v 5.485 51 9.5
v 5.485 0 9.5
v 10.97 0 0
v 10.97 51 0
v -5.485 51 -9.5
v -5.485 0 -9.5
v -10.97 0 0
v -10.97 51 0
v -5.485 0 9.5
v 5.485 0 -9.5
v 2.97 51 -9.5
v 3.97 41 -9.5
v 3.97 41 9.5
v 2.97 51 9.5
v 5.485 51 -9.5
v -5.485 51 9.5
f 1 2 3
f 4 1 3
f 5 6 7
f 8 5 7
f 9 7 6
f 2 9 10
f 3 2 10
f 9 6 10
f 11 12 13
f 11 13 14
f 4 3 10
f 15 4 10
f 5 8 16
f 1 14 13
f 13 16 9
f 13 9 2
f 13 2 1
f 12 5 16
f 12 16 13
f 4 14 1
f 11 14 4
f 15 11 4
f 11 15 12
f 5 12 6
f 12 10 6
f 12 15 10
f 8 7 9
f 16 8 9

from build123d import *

# Parameters (mm, degrees)
BOSS_EXTRUDE1_DEPTH     = 51
CUT_EXTRUDE1_DEPTH      = 54.024365468
CUT_EXTRUDE1_DEPTH_BACK = 54.024365468


with BuildPart() as part:
    # Sketch1 → Boss-Extrude1 (new body)
    with BuildSketch(Plane(origin=(0, 0, 0), x_dir=(1, 0, 0), z_dir=(0, 1, 0))):
        Polygon((-5.484827557, -9.5), (5.484827557, -9.5), (10.969655115, 0), (5.484827557, 9.5), (-5.484827557, 9.5), (-10.969655115, 0), align=None)
    extrude(amount=BOSS_EXTRUDE1_DEPTH)

    # Sketch3 → Cut-Extrude1 (cut, two sides: drawn at the far end of the back side and taken through both)
    with BuildSketch(Plane.XY.offset(-CUT_EXTRUDE1_DEPTH_BACK)):
        Polygon((-5.484827557, 51), (3.969655115, 41), (2.969655115, 51), align=None)
    extrude(amount=CUT_EXTRUDE1_DEPTH + CUT_EXTRUDE1_DEPTH_BACK, mode=Mode.SUBTRACT)


solid = part.part
